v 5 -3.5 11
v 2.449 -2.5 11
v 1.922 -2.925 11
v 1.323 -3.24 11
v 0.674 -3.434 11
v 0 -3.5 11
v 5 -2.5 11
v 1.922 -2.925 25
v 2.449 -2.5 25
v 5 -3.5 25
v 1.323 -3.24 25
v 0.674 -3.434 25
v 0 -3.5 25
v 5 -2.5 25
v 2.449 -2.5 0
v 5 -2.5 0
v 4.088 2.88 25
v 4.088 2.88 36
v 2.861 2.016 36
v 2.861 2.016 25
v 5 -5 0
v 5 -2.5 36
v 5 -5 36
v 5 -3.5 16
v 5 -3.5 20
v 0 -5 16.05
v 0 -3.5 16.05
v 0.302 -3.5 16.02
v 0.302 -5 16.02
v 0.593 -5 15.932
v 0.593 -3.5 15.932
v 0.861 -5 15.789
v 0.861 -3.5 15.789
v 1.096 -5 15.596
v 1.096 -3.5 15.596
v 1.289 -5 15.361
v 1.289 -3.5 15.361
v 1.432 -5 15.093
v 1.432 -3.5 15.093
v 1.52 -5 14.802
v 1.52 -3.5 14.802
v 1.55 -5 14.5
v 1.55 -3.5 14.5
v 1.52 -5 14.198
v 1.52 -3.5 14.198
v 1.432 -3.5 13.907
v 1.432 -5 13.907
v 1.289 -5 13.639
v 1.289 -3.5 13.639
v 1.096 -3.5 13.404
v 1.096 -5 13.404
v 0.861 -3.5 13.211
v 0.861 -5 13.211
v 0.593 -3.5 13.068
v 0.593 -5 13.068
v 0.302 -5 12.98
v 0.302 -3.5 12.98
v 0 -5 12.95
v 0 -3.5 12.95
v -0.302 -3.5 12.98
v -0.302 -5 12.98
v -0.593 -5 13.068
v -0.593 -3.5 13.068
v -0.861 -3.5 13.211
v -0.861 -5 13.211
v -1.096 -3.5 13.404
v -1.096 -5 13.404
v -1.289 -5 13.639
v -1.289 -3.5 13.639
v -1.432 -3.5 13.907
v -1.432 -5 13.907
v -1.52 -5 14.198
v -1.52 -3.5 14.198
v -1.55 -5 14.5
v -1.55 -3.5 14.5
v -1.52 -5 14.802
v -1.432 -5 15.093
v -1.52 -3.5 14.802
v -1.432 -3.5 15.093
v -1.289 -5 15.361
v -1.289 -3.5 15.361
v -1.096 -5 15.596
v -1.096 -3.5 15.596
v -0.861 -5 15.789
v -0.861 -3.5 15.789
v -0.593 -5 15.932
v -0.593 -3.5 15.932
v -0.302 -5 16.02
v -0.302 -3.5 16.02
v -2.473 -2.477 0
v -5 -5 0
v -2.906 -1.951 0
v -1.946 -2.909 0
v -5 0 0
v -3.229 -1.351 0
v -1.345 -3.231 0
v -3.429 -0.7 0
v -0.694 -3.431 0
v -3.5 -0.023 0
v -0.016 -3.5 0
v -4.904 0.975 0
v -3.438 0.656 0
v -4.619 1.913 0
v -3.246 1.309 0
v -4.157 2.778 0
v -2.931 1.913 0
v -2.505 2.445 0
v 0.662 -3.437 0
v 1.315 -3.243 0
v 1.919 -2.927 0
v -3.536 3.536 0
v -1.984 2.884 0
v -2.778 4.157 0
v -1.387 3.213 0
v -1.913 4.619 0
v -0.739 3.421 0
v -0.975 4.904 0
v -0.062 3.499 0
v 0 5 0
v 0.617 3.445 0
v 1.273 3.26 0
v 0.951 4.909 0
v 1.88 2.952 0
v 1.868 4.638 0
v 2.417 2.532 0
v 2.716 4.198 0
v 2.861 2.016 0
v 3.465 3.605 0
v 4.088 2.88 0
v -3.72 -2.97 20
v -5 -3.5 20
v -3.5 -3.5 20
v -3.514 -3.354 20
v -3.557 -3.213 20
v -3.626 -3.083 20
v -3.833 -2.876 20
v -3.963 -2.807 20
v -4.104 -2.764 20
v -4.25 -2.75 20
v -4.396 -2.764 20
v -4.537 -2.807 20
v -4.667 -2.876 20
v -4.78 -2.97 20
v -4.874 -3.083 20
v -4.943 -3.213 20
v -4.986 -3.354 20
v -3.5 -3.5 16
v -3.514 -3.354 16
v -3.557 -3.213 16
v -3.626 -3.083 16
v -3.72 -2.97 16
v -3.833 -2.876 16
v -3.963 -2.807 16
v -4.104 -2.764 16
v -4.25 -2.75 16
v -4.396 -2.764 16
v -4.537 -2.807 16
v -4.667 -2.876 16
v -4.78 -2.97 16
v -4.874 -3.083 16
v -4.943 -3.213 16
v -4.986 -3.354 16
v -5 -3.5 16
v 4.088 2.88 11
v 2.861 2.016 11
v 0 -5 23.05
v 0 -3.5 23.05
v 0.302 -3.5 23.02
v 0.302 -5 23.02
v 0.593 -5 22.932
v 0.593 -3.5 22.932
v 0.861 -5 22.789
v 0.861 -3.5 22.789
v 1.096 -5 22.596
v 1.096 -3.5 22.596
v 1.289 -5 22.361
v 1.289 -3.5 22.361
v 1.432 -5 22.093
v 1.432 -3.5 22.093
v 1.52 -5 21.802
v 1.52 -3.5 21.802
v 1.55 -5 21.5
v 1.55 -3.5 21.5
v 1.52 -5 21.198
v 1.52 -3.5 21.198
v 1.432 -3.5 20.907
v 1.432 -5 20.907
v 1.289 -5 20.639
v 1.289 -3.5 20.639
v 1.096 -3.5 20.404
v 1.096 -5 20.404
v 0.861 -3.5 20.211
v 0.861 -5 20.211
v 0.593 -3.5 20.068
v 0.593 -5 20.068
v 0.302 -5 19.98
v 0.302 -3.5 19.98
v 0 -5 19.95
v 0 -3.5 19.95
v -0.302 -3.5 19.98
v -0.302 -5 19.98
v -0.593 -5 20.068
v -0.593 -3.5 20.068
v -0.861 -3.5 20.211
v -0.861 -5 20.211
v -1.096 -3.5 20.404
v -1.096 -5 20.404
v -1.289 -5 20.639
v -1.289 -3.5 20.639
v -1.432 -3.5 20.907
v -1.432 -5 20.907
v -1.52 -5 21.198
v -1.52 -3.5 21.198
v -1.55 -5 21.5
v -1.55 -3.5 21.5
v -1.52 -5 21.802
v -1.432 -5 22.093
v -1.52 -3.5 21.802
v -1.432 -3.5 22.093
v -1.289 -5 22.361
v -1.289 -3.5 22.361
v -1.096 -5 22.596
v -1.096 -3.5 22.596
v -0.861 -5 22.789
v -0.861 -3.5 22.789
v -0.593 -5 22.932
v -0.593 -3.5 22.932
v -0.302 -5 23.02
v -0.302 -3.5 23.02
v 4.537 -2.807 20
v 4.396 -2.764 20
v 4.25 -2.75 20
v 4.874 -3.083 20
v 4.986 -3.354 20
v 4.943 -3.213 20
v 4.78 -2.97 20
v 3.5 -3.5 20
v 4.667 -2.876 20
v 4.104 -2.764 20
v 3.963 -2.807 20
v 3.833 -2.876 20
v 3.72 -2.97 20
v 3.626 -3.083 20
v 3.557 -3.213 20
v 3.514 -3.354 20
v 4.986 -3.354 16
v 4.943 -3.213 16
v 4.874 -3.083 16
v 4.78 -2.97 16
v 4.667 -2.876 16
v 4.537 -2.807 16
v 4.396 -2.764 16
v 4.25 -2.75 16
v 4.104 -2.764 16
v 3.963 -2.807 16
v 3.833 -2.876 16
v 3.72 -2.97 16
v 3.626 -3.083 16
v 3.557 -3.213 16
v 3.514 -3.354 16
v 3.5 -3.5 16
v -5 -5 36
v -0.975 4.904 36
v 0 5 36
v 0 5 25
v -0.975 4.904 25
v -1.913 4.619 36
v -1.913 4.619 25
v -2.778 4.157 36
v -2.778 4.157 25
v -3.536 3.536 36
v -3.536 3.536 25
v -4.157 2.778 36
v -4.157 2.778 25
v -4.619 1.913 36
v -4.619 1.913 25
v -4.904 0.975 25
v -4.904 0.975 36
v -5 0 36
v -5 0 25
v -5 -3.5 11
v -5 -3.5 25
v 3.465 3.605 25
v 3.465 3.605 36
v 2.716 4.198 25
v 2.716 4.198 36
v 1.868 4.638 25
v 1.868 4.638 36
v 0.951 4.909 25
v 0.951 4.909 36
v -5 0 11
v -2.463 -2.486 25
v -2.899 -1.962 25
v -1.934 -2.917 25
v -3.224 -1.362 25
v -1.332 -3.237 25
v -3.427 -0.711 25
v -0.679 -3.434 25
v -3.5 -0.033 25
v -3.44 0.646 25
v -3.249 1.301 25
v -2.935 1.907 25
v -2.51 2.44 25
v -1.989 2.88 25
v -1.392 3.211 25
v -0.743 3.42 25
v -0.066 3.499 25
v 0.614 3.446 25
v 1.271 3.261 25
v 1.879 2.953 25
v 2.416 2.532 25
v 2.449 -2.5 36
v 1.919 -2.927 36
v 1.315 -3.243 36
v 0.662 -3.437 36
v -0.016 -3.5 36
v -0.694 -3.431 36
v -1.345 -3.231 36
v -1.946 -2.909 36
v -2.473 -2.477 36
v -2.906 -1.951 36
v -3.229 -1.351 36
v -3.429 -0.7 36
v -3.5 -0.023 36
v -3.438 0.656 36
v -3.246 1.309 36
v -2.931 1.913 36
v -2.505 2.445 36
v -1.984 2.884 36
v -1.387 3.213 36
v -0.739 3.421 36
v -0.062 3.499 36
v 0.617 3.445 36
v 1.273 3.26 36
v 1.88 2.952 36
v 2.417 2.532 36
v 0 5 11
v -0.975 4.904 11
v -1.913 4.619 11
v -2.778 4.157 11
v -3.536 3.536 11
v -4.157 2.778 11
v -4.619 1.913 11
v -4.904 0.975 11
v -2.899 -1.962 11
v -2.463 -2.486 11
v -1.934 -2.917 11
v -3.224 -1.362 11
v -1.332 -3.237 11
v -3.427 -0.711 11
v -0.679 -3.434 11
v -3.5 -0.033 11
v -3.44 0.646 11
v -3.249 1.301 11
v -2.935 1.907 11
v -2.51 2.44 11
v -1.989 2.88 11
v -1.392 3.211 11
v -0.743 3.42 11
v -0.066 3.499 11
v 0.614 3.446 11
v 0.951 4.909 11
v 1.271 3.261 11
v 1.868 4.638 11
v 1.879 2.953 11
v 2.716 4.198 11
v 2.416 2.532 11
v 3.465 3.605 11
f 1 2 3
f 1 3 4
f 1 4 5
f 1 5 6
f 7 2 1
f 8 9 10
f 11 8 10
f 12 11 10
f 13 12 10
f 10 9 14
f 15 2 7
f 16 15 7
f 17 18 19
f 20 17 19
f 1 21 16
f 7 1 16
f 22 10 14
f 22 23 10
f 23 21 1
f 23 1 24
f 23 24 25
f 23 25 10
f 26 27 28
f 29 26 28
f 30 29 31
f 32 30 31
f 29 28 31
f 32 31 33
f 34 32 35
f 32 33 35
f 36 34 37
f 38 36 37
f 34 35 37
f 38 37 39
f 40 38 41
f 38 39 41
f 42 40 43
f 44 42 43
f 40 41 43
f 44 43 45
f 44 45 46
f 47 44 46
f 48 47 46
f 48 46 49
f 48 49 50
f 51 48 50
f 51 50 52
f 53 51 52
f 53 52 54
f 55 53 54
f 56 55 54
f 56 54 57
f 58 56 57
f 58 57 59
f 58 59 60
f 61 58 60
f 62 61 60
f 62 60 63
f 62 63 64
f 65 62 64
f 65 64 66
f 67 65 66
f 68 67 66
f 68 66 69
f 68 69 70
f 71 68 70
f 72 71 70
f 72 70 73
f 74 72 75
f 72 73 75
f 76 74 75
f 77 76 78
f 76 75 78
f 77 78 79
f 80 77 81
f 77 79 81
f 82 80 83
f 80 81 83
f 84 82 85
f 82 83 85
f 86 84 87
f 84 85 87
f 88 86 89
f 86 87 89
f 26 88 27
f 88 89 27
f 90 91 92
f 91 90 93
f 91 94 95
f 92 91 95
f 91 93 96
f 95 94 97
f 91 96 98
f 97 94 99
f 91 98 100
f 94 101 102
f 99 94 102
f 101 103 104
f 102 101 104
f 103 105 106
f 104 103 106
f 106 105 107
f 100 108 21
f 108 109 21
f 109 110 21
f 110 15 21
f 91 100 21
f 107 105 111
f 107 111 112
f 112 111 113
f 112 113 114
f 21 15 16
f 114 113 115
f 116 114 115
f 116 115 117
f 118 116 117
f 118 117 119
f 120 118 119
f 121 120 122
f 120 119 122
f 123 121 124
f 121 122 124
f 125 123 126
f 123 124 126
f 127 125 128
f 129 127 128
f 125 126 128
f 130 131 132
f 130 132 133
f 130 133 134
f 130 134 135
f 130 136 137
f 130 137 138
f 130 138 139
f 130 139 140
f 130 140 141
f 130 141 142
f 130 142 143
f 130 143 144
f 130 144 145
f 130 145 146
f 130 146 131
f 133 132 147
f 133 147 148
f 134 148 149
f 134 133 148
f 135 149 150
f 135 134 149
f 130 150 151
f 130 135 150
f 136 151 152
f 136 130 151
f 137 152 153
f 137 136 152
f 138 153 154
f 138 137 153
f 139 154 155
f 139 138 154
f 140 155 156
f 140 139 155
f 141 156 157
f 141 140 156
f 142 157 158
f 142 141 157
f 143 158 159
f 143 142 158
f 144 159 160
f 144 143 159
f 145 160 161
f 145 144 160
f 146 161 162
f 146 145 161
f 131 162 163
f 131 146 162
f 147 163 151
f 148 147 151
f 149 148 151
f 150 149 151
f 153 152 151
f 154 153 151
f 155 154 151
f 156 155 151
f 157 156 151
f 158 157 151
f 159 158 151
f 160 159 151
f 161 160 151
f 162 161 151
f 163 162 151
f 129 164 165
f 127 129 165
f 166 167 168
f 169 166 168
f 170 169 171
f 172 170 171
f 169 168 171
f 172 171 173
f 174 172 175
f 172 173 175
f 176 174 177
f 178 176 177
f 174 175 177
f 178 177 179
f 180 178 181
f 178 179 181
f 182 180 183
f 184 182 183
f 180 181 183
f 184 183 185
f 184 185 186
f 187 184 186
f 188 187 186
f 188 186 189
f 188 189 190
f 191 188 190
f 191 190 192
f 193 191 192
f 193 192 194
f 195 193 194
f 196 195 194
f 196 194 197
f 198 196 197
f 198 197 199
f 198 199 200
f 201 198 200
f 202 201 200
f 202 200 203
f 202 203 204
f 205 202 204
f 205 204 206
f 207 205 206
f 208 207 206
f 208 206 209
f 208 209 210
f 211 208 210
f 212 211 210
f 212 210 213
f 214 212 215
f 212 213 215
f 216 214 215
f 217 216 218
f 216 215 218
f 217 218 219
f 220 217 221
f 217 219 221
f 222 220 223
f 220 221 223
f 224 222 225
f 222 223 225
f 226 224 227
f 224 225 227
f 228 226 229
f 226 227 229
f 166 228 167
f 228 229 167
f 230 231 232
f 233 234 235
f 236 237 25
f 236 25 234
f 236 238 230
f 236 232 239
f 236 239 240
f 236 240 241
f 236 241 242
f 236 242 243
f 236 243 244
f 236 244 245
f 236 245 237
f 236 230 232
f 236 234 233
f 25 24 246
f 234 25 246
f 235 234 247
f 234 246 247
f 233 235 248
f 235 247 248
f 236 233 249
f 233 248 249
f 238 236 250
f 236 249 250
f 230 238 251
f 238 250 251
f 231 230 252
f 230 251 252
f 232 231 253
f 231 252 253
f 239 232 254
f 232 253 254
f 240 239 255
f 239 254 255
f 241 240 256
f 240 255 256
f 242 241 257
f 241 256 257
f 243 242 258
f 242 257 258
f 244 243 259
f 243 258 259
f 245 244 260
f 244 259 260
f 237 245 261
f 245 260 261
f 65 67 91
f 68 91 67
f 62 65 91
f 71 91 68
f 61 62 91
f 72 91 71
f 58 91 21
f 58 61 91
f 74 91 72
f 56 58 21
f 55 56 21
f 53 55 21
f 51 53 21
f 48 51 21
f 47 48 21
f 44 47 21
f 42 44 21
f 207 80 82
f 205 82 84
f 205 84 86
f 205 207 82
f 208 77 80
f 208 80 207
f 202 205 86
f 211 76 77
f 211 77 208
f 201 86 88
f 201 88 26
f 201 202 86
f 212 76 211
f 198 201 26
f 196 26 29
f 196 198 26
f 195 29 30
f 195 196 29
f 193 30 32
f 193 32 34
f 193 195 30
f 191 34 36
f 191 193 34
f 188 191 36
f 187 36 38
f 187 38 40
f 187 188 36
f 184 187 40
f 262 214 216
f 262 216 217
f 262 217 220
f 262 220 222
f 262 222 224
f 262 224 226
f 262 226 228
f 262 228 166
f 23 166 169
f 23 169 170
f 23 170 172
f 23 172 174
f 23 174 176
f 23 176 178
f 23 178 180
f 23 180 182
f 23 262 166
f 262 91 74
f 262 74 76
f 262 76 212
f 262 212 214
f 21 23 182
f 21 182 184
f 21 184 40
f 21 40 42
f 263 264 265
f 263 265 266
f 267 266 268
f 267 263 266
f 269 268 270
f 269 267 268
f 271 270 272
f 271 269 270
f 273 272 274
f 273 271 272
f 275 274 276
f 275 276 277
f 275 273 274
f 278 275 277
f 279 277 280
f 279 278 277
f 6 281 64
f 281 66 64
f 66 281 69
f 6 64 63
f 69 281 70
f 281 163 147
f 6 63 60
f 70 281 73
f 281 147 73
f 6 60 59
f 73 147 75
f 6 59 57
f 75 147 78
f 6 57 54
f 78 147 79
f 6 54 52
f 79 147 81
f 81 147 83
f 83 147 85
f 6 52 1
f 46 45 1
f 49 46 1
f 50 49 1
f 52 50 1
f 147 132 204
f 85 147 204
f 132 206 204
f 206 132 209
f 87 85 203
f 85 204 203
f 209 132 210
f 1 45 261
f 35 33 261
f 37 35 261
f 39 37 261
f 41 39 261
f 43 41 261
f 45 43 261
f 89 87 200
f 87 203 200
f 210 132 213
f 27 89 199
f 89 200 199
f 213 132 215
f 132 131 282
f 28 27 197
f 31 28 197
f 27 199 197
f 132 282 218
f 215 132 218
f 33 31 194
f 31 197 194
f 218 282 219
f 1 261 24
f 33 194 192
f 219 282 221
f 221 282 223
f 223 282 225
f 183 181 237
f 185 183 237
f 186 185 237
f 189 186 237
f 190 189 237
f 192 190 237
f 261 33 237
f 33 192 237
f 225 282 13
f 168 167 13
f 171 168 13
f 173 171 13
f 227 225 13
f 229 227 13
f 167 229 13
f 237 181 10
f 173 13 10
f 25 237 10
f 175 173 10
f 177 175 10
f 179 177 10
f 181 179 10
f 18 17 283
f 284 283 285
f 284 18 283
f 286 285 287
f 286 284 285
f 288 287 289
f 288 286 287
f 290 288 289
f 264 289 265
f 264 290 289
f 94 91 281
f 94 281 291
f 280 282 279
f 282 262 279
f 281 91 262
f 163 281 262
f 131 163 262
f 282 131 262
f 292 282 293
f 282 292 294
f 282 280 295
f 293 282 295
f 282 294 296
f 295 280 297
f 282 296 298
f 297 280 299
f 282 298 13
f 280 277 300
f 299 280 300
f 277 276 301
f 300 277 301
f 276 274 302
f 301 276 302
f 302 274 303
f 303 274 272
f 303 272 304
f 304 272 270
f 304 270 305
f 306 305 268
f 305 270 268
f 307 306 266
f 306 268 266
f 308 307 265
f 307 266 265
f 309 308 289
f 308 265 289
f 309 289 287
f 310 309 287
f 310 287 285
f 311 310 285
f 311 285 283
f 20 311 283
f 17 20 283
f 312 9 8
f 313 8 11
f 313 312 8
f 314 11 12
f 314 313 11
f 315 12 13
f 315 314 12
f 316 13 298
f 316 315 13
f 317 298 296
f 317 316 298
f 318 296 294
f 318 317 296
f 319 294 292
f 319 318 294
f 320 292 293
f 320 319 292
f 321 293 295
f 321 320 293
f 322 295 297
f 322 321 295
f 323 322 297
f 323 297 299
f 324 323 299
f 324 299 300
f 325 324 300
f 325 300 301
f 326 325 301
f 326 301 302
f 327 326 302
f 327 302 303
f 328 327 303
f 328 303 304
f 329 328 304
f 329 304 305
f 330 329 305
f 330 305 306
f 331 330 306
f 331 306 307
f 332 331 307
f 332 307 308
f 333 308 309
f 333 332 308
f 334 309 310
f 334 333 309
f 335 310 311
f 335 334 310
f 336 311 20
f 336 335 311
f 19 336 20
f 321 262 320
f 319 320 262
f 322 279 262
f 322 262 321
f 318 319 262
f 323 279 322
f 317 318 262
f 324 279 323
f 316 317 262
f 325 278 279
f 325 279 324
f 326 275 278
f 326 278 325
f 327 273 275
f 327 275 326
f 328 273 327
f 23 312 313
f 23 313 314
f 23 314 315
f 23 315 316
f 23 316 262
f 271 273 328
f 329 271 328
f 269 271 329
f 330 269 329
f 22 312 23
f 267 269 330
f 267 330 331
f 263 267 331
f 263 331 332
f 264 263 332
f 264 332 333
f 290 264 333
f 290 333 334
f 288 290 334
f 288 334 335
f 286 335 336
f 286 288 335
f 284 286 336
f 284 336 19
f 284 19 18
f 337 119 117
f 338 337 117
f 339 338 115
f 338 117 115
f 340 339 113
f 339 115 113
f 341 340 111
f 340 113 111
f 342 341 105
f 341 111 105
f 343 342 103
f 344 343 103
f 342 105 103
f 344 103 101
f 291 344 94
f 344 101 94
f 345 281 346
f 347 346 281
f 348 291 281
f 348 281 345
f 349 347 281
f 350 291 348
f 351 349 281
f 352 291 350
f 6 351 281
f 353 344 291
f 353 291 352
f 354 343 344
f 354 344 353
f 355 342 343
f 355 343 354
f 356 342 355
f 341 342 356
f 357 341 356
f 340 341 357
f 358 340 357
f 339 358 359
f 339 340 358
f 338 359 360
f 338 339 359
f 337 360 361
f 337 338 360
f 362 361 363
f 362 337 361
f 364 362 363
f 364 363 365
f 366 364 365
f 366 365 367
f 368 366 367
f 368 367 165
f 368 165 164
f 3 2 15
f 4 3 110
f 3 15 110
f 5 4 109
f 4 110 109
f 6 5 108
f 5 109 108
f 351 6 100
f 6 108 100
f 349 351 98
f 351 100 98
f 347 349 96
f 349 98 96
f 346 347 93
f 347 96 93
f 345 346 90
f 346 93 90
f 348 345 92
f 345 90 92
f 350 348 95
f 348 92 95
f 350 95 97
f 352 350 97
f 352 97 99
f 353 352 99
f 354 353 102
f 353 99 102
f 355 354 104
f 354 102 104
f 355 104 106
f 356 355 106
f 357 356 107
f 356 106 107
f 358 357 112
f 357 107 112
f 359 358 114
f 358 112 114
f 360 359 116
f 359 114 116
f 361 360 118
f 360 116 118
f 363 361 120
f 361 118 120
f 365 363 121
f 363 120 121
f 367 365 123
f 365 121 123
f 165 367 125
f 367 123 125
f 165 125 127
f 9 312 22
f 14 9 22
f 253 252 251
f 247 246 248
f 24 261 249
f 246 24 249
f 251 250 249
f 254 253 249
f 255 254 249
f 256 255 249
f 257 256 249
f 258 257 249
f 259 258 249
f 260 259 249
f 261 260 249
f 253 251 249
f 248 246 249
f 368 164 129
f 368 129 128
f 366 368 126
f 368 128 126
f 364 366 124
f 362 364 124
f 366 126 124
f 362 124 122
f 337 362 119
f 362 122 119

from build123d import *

# Parameters (mm, degrees)
RESSALTO_EXTRUS_O1_DEPTH = 11
ESBO_O2_W                = 10
ESBO_O2_H                = 1.5
RESSALTO_EXTRUS_O2_DEPTH = 7
RESSALTO_EXTRUS_O3_DEPTH = 2
ESBO_O4_R                = 1.55
CORTE_EXTRUS_O1_DEPTH    = 2
CORTE_EXTRUS_O2_DEPTH    = 37.687872656


with BuildPart() as part:
    # Esboço1 → Ressalto-extrusão1 (new body)
    with BuildSketch(Plane.XY):
        with BuildLine():
            Line((-5, -5), (0, -5))
            ThreePointArc((0, -5), (-3.535533906, -3.535533906), (-5, 0))
            Line((-5, 0), (-5, -5))
        make_face()
        with BuildLine():
            Line((5, -5), (5, 0))
            ThreePointArc((5, 0), (3.535533906, -3.535533906), (0, -5))
            Line((0, -5), (5, -5))
        make_face()
        with BuildLine():
            ThreePointArc((-3.5, 0), (0, 3.5), (3.5, 0))
            Line((3.5, 0), (5, 0))
            ThreePointArc((5, 0), (3.535533906, 3.535533905), (1e-09, 5))
            ThreePointArc((1e-09, 5), (-3.535533905, 3.535533906), (-5, 0))
            Line((-5, 0), (-3.5, 0))
        make_face()
        with BuildLine():
            Line((5, 0), (3.5, 0))
            ThreePointArc((3.5, 0), (0, -3.5), (-3.5, 0))
            Line((-3.5, 0), (-5, 0))
            ThreePointArc((-5, 0), (-3.535533906, -3.535533906), (0, -5))
            ThreePointArc((0, -5), (3.535533906, -3.535533906), (5, 0))
        make_face()
    ressalto_extrus_o1 = extrude(amount=RESSALTO_EXTRUS_O1_DEPTH)

    # Esboço2 → Ressalto-extrusão2 (add)
    with BuildSketch(Plane.XY.offset(11)):
        with Locations((0, -4.25)):
            Rectangle(ESBO_O2_W, ESBO_O2_H)
    ressalto_extrus_o2 = extrude(amount=RESSALTO_EXTRUS_O2_DEPTH)

    # Esboço3 → Ressalto-extrusão3 (add)
    with BuildSketch(Plane.XY.offset(18)):
        with BuildLine():
            Line((3.5, -3.5), (5, -3.5))
            ThreePointArc((5, -3.5), (4.25, -2.75), (3.5, -3.5))
        make_face()
        with BuildLine():
            Line((-5, -3.5), (-3.5, -3.5))
            ThreePointArc((-3.5, -3.5), (-4.25, -2.75), (-5, -3.5))
        make_face()
    ressalto_extrus_o3 = extrude(amount=-RESSALTO_EXTRUS_O3_DEPTH)

    # Espelhar1: Ressalto-extrusão1, Ressalto-extrusão2, Ressalto-extrusão3 across plane
    add(ressalto_extrus_o1.mirror(Plane(origin=(0, 0, 18), x_dir=(1, 0, 0), z_dir=(0, 0, -1))))
    add(ressalto_extrus_o2.mirror(Plane(origin=(0, 0, 18), x_dir=(1, 0, 0), z_dir=(0, 0, -1))))
    add(ressalto_extrus_o3.mirror(Plane(origin=(0, 0, 18), x_dir=(1, 0, 0), z_dir=(0, 0, -1))))

    # Esboço4 → Corte-extrusão1 (cut)
    with BuildSketch(Plane(origin=(0, -3.5, 0), x_dir=(1, 0, 0), z_dir=(0, 1, 0))):
        with Locations(Location((0, -14.5, 0), (0, 0, 270))):
            Circle(ESBO_O4_R)
        with Locations(Location((0, -21.5, 0), (0, 0, 270))):
            Circle(ESBO_O4_R)
    extrude(amount=-CORTE_EXTRUS_O1_DEPTH, mode=Mode.SUBTRACT)

    # Esboço5 → Corte-extrusão2 (cut, through all)
    with BuildSketch(Plane.XY.offset(36)):
        with BuildLine():
            Line((2.449489743, -2.5), (5, -2.5))
            Line((5, -2.5), (5, 0))
            ThreePointArc((5, 0), (4.766431527, 1.510341187), (4.087547799, 2.87957514))
            Line((4.087547799, 2.87957514), (2.861283459, 2.015702598))
            ThreePointArc((2.861283459, 2.015702598), (3.336502069, 1.057238831), (3.5, 0))
            ThreePointArc((3.5, 0), (3.226702194, -1.355873501), (2.449489743, -2.5))
        make_face()
    extrude(amount=-CORTE_EXTRUS_O2_DEPTH, mode=Mode.SUBTRACT)


solid = part.part
